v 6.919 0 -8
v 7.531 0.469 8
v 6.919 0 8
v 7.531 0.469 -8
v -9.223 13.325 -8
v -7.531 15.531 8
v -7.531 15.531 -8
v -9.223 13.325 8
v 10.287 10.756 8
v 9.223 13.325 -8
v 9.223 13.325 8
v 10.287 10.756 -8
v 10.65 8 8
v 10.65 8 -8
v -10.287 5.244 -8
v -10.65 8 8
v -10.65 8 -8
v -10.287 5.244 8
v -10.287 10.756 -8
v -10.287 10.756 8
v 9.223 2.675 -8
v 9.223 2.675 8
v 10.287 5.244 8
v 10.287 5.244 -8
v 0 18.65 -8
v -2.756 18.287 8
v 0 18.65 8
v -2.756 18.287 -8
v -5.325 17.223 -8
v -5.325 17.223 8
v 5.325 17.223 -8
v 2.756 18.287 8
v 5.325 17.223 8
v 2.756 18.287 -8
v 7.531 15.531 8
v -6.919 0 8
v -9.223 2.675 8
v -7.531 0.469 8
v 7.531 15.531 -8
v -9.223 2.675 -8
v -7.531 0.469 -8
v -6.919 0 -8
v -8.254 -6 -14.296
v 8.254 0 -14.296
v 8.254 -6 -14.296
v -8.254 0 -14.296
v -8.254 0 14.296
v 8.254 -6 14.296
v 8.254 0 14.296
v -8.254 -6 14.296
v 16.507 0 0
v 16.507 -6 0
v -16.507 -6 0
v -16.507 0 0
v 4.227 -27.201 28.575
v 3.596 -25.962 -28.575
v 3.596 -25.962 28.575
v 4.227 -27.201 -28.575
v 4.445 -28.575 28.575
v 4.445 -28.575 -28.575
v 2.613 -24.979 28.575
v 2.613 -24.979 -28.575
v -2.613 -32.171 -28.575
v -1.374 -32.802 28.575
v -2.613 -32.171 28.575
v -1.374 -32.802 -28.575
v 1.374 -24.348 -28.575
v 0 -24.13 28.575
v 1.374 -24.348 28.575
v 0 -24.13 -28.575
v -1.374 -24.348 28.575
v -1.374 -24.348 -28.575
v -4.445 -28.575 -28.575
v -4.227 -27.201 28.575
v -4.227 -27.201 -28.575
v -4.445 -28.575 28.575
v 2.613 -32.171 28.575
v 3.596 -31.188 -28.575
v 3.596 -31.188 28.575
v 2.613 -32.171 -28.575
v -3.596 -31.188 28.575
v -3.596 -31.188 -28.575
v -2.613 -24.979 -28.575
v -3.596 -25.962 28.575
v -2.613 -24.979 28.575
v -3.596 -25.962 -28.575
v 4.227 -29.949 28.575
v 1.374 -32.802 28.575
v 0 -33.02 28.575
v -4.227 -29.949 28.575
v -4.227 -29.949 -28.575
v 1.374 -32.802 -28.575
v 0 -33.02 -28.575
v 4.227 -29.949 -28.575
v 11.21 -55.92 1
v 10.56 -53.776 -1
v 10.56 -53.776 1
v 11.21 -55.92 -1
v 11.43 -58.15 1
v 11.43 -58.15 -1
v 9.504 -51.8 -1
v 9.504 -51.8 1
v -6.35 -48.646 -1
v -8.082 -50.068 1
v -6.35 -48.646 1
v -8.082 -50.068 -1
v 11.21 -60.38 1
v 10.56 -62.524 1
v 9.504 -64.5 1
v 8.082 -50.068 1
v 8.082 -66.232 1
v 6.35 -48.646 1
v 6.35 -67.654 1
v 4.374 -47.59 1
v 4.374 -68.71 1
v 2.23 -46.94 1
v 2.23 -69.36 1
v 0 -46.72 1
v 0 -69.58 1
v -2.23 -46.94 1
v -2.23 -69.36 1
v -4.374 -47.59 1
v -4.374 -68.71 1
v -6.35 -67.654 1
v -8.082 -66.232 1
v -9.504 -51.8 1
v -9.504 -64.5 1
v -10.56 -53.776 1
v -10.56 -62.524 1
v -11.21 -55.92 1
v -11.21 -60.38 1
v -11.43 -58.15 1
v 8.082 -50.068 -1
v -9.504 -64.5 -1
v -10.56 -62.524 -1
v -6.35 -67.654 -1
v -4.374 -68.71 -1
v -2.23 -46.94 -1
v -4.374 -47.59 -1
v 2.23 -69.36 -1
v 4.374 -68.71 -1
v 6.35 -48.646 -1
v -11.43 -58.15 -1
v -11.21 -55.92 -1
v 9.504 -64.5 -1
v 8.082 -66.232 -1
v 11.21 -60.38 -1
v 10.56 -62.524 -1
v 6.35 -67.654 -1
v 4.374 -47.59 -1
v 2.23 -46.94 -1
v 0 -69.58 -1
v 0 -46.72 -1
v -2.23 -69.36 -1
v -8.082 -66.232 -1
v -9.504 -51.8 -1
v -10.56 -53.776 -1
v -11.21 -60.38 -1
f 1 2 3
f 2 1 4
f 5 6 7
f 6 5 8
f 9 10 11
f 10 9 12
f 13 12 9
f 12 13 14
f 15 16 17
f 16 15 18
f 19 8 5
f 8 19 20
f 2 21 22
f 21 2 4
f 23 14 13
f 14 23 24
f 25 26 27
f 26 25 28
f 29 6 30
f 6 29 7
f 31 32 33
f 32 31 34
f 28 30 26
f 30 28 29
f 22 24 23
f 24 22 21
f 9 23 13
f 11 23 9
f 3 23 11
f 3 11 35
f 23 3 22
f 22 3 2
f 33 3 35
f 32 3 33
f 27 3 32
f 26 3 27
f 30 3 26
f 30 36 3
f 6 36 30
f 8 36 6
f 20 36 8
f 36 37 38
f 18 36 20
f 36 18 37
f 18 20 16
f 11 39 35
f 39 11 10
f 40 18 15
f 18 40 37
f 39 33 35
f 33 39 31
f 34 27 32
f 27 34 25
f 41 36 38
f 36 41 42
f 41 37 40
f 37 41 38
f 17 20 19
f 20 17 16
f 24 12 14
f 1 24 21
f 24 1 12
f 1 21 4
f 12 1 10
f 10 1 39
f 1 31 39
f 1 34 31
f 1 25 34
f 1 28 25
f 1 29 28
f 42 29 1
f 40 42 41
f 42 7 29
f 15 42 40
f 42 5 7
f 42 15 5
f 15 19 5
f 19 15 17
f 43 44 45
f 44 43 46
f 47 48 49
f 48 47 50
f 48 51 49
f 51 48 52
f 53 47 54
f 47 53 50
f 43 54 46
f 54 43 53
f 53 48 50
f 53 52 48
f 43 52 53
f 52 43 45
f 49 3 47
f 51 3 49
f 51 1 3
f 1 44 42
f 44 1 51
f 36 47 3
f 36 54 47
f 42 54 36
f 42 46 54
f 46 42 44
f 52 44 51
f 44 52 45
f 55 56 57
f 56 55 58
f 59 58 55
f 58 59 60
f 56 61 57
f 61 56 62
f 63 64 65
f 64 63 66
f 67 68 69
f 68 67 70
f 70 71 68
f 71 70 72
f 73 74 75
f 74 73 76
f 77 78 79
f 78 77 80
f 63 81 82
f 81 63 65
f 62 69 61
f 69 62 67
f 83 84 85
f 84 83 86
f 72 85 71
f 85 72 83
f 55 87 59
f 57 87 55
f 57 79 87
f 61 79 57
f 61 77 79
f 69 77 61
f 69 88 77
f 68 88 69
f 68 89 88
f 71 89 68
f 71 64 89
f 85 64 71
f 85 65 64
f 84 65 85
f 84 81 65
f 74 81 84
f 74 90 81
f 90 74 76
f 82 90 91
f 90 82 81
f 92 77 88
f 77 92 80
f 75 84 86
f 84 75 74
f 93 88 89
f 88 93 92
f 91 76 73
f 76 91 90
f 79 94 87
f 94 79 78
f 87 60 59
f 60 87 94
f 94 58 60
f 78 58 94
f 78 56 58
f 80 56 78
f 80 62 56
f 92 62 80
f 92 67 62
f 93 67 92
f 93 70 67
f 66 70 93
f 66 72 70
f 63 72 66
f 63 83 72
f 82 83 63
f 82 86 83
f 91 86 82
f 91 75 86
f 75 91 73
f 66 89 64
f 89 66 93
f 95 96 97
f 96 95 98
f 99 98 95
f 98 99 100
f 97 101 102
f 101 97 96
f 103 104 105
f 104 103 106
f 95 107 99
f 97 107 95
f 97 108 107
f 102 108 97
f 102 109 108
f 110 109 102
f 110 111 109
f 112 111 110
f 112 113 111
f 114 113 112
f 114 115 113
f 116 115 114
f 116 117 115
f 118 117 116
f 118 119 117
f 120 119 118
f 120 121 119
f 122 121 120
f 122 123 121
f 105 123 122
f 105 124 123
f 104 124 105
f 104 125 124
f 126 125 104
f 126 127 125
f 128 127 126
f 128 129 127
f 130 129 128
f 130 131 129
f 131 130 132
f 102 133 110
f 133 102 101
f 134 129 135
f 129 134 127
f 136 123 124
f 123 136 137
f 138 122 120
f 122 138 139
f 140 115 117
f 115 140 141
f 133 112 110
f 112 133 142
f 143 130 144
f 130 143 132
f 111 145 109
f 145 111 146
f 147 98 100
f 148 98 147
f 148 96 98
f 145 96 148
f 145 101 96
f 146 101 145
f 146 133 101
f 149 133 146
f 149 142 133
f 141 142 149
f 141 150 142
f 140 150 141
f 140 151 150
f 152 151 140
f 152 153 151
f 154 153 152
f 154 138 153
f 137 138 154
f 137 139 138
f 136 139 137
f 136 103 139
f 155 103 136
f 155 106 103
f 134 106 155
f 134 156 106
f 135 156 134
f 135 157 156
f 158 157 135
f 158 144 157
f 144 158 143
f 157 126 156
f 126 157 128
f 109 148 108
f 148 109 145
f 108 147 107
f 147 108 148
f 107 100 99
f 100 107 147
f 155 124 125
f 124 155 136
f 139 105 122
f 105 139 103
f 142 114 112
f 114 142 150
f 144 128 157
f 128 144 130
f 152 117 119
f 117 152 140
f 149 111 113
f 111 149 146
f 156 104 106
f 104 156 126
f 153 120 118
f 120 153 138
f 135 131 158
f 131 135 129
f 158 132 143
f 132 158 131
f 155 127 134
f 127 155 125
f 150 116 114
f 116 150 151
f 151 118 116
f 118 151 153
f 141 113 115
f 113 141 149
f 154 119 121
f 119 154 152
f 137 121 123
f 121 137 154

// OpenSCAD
// Auto-generated by scripts/author_from_manifest.py (Phase D.3).
// Source: data/phase_d_manifest.json (sku_intent='viking-vk200-pendent-286f').
// Do not hand-edit — regenerate from the manifest.
//
// @part viking_vk200_pendent_286f
// @kind sprinkler_head
// @category head.pendant.k56
// @display-name "Viking VK200 Pendent K5.6 SR 286°F"
// @mfg viking_group
// @mfg-pn VK200
// @listing UL FM
// @hazard-classes LH OH1
// @price-usd 13.10
// @install-minutes 8
// @crew journeyman
// @k-factor 5.6
// @orientation pendant
// @response standard
// @temperature 286F
// @param size_in number default=0.5 label="Size" unit="in"
// @port inlet position=[0,0.014,0] direction=[0,1,0] style=NPT_threaded size_in=0.5 role=drop

size_in = 0.5;
k_factor = 5.6;

length_mm   = 57.15;
body_dia_mm = 25.40;
thread_od   = 21.3;
thread_len  = 16;
deflector_d = body_dia_mm * 0.9;

 union() {
    translate([0, thread_len/2, 0])
        cylinder(h = thread_len, d = thread_od, center = true, $fn = 24);
    translate([0, -3, 0])
        rotate([90, 0, 0])
        cylinder(h = 6, d = thread_od * 1.55, $fn = 6, center = true);
    translate([0, -length_mm/2, 0])
        cylinder(h = length_mm, d = body_dia_mm * 0.35, center = true, $fn = 20);
    translate([0, -length_mm - 1, 0])
        cylinder(h = 2, d = deflector_d, center = true, $fn = 32);
}
